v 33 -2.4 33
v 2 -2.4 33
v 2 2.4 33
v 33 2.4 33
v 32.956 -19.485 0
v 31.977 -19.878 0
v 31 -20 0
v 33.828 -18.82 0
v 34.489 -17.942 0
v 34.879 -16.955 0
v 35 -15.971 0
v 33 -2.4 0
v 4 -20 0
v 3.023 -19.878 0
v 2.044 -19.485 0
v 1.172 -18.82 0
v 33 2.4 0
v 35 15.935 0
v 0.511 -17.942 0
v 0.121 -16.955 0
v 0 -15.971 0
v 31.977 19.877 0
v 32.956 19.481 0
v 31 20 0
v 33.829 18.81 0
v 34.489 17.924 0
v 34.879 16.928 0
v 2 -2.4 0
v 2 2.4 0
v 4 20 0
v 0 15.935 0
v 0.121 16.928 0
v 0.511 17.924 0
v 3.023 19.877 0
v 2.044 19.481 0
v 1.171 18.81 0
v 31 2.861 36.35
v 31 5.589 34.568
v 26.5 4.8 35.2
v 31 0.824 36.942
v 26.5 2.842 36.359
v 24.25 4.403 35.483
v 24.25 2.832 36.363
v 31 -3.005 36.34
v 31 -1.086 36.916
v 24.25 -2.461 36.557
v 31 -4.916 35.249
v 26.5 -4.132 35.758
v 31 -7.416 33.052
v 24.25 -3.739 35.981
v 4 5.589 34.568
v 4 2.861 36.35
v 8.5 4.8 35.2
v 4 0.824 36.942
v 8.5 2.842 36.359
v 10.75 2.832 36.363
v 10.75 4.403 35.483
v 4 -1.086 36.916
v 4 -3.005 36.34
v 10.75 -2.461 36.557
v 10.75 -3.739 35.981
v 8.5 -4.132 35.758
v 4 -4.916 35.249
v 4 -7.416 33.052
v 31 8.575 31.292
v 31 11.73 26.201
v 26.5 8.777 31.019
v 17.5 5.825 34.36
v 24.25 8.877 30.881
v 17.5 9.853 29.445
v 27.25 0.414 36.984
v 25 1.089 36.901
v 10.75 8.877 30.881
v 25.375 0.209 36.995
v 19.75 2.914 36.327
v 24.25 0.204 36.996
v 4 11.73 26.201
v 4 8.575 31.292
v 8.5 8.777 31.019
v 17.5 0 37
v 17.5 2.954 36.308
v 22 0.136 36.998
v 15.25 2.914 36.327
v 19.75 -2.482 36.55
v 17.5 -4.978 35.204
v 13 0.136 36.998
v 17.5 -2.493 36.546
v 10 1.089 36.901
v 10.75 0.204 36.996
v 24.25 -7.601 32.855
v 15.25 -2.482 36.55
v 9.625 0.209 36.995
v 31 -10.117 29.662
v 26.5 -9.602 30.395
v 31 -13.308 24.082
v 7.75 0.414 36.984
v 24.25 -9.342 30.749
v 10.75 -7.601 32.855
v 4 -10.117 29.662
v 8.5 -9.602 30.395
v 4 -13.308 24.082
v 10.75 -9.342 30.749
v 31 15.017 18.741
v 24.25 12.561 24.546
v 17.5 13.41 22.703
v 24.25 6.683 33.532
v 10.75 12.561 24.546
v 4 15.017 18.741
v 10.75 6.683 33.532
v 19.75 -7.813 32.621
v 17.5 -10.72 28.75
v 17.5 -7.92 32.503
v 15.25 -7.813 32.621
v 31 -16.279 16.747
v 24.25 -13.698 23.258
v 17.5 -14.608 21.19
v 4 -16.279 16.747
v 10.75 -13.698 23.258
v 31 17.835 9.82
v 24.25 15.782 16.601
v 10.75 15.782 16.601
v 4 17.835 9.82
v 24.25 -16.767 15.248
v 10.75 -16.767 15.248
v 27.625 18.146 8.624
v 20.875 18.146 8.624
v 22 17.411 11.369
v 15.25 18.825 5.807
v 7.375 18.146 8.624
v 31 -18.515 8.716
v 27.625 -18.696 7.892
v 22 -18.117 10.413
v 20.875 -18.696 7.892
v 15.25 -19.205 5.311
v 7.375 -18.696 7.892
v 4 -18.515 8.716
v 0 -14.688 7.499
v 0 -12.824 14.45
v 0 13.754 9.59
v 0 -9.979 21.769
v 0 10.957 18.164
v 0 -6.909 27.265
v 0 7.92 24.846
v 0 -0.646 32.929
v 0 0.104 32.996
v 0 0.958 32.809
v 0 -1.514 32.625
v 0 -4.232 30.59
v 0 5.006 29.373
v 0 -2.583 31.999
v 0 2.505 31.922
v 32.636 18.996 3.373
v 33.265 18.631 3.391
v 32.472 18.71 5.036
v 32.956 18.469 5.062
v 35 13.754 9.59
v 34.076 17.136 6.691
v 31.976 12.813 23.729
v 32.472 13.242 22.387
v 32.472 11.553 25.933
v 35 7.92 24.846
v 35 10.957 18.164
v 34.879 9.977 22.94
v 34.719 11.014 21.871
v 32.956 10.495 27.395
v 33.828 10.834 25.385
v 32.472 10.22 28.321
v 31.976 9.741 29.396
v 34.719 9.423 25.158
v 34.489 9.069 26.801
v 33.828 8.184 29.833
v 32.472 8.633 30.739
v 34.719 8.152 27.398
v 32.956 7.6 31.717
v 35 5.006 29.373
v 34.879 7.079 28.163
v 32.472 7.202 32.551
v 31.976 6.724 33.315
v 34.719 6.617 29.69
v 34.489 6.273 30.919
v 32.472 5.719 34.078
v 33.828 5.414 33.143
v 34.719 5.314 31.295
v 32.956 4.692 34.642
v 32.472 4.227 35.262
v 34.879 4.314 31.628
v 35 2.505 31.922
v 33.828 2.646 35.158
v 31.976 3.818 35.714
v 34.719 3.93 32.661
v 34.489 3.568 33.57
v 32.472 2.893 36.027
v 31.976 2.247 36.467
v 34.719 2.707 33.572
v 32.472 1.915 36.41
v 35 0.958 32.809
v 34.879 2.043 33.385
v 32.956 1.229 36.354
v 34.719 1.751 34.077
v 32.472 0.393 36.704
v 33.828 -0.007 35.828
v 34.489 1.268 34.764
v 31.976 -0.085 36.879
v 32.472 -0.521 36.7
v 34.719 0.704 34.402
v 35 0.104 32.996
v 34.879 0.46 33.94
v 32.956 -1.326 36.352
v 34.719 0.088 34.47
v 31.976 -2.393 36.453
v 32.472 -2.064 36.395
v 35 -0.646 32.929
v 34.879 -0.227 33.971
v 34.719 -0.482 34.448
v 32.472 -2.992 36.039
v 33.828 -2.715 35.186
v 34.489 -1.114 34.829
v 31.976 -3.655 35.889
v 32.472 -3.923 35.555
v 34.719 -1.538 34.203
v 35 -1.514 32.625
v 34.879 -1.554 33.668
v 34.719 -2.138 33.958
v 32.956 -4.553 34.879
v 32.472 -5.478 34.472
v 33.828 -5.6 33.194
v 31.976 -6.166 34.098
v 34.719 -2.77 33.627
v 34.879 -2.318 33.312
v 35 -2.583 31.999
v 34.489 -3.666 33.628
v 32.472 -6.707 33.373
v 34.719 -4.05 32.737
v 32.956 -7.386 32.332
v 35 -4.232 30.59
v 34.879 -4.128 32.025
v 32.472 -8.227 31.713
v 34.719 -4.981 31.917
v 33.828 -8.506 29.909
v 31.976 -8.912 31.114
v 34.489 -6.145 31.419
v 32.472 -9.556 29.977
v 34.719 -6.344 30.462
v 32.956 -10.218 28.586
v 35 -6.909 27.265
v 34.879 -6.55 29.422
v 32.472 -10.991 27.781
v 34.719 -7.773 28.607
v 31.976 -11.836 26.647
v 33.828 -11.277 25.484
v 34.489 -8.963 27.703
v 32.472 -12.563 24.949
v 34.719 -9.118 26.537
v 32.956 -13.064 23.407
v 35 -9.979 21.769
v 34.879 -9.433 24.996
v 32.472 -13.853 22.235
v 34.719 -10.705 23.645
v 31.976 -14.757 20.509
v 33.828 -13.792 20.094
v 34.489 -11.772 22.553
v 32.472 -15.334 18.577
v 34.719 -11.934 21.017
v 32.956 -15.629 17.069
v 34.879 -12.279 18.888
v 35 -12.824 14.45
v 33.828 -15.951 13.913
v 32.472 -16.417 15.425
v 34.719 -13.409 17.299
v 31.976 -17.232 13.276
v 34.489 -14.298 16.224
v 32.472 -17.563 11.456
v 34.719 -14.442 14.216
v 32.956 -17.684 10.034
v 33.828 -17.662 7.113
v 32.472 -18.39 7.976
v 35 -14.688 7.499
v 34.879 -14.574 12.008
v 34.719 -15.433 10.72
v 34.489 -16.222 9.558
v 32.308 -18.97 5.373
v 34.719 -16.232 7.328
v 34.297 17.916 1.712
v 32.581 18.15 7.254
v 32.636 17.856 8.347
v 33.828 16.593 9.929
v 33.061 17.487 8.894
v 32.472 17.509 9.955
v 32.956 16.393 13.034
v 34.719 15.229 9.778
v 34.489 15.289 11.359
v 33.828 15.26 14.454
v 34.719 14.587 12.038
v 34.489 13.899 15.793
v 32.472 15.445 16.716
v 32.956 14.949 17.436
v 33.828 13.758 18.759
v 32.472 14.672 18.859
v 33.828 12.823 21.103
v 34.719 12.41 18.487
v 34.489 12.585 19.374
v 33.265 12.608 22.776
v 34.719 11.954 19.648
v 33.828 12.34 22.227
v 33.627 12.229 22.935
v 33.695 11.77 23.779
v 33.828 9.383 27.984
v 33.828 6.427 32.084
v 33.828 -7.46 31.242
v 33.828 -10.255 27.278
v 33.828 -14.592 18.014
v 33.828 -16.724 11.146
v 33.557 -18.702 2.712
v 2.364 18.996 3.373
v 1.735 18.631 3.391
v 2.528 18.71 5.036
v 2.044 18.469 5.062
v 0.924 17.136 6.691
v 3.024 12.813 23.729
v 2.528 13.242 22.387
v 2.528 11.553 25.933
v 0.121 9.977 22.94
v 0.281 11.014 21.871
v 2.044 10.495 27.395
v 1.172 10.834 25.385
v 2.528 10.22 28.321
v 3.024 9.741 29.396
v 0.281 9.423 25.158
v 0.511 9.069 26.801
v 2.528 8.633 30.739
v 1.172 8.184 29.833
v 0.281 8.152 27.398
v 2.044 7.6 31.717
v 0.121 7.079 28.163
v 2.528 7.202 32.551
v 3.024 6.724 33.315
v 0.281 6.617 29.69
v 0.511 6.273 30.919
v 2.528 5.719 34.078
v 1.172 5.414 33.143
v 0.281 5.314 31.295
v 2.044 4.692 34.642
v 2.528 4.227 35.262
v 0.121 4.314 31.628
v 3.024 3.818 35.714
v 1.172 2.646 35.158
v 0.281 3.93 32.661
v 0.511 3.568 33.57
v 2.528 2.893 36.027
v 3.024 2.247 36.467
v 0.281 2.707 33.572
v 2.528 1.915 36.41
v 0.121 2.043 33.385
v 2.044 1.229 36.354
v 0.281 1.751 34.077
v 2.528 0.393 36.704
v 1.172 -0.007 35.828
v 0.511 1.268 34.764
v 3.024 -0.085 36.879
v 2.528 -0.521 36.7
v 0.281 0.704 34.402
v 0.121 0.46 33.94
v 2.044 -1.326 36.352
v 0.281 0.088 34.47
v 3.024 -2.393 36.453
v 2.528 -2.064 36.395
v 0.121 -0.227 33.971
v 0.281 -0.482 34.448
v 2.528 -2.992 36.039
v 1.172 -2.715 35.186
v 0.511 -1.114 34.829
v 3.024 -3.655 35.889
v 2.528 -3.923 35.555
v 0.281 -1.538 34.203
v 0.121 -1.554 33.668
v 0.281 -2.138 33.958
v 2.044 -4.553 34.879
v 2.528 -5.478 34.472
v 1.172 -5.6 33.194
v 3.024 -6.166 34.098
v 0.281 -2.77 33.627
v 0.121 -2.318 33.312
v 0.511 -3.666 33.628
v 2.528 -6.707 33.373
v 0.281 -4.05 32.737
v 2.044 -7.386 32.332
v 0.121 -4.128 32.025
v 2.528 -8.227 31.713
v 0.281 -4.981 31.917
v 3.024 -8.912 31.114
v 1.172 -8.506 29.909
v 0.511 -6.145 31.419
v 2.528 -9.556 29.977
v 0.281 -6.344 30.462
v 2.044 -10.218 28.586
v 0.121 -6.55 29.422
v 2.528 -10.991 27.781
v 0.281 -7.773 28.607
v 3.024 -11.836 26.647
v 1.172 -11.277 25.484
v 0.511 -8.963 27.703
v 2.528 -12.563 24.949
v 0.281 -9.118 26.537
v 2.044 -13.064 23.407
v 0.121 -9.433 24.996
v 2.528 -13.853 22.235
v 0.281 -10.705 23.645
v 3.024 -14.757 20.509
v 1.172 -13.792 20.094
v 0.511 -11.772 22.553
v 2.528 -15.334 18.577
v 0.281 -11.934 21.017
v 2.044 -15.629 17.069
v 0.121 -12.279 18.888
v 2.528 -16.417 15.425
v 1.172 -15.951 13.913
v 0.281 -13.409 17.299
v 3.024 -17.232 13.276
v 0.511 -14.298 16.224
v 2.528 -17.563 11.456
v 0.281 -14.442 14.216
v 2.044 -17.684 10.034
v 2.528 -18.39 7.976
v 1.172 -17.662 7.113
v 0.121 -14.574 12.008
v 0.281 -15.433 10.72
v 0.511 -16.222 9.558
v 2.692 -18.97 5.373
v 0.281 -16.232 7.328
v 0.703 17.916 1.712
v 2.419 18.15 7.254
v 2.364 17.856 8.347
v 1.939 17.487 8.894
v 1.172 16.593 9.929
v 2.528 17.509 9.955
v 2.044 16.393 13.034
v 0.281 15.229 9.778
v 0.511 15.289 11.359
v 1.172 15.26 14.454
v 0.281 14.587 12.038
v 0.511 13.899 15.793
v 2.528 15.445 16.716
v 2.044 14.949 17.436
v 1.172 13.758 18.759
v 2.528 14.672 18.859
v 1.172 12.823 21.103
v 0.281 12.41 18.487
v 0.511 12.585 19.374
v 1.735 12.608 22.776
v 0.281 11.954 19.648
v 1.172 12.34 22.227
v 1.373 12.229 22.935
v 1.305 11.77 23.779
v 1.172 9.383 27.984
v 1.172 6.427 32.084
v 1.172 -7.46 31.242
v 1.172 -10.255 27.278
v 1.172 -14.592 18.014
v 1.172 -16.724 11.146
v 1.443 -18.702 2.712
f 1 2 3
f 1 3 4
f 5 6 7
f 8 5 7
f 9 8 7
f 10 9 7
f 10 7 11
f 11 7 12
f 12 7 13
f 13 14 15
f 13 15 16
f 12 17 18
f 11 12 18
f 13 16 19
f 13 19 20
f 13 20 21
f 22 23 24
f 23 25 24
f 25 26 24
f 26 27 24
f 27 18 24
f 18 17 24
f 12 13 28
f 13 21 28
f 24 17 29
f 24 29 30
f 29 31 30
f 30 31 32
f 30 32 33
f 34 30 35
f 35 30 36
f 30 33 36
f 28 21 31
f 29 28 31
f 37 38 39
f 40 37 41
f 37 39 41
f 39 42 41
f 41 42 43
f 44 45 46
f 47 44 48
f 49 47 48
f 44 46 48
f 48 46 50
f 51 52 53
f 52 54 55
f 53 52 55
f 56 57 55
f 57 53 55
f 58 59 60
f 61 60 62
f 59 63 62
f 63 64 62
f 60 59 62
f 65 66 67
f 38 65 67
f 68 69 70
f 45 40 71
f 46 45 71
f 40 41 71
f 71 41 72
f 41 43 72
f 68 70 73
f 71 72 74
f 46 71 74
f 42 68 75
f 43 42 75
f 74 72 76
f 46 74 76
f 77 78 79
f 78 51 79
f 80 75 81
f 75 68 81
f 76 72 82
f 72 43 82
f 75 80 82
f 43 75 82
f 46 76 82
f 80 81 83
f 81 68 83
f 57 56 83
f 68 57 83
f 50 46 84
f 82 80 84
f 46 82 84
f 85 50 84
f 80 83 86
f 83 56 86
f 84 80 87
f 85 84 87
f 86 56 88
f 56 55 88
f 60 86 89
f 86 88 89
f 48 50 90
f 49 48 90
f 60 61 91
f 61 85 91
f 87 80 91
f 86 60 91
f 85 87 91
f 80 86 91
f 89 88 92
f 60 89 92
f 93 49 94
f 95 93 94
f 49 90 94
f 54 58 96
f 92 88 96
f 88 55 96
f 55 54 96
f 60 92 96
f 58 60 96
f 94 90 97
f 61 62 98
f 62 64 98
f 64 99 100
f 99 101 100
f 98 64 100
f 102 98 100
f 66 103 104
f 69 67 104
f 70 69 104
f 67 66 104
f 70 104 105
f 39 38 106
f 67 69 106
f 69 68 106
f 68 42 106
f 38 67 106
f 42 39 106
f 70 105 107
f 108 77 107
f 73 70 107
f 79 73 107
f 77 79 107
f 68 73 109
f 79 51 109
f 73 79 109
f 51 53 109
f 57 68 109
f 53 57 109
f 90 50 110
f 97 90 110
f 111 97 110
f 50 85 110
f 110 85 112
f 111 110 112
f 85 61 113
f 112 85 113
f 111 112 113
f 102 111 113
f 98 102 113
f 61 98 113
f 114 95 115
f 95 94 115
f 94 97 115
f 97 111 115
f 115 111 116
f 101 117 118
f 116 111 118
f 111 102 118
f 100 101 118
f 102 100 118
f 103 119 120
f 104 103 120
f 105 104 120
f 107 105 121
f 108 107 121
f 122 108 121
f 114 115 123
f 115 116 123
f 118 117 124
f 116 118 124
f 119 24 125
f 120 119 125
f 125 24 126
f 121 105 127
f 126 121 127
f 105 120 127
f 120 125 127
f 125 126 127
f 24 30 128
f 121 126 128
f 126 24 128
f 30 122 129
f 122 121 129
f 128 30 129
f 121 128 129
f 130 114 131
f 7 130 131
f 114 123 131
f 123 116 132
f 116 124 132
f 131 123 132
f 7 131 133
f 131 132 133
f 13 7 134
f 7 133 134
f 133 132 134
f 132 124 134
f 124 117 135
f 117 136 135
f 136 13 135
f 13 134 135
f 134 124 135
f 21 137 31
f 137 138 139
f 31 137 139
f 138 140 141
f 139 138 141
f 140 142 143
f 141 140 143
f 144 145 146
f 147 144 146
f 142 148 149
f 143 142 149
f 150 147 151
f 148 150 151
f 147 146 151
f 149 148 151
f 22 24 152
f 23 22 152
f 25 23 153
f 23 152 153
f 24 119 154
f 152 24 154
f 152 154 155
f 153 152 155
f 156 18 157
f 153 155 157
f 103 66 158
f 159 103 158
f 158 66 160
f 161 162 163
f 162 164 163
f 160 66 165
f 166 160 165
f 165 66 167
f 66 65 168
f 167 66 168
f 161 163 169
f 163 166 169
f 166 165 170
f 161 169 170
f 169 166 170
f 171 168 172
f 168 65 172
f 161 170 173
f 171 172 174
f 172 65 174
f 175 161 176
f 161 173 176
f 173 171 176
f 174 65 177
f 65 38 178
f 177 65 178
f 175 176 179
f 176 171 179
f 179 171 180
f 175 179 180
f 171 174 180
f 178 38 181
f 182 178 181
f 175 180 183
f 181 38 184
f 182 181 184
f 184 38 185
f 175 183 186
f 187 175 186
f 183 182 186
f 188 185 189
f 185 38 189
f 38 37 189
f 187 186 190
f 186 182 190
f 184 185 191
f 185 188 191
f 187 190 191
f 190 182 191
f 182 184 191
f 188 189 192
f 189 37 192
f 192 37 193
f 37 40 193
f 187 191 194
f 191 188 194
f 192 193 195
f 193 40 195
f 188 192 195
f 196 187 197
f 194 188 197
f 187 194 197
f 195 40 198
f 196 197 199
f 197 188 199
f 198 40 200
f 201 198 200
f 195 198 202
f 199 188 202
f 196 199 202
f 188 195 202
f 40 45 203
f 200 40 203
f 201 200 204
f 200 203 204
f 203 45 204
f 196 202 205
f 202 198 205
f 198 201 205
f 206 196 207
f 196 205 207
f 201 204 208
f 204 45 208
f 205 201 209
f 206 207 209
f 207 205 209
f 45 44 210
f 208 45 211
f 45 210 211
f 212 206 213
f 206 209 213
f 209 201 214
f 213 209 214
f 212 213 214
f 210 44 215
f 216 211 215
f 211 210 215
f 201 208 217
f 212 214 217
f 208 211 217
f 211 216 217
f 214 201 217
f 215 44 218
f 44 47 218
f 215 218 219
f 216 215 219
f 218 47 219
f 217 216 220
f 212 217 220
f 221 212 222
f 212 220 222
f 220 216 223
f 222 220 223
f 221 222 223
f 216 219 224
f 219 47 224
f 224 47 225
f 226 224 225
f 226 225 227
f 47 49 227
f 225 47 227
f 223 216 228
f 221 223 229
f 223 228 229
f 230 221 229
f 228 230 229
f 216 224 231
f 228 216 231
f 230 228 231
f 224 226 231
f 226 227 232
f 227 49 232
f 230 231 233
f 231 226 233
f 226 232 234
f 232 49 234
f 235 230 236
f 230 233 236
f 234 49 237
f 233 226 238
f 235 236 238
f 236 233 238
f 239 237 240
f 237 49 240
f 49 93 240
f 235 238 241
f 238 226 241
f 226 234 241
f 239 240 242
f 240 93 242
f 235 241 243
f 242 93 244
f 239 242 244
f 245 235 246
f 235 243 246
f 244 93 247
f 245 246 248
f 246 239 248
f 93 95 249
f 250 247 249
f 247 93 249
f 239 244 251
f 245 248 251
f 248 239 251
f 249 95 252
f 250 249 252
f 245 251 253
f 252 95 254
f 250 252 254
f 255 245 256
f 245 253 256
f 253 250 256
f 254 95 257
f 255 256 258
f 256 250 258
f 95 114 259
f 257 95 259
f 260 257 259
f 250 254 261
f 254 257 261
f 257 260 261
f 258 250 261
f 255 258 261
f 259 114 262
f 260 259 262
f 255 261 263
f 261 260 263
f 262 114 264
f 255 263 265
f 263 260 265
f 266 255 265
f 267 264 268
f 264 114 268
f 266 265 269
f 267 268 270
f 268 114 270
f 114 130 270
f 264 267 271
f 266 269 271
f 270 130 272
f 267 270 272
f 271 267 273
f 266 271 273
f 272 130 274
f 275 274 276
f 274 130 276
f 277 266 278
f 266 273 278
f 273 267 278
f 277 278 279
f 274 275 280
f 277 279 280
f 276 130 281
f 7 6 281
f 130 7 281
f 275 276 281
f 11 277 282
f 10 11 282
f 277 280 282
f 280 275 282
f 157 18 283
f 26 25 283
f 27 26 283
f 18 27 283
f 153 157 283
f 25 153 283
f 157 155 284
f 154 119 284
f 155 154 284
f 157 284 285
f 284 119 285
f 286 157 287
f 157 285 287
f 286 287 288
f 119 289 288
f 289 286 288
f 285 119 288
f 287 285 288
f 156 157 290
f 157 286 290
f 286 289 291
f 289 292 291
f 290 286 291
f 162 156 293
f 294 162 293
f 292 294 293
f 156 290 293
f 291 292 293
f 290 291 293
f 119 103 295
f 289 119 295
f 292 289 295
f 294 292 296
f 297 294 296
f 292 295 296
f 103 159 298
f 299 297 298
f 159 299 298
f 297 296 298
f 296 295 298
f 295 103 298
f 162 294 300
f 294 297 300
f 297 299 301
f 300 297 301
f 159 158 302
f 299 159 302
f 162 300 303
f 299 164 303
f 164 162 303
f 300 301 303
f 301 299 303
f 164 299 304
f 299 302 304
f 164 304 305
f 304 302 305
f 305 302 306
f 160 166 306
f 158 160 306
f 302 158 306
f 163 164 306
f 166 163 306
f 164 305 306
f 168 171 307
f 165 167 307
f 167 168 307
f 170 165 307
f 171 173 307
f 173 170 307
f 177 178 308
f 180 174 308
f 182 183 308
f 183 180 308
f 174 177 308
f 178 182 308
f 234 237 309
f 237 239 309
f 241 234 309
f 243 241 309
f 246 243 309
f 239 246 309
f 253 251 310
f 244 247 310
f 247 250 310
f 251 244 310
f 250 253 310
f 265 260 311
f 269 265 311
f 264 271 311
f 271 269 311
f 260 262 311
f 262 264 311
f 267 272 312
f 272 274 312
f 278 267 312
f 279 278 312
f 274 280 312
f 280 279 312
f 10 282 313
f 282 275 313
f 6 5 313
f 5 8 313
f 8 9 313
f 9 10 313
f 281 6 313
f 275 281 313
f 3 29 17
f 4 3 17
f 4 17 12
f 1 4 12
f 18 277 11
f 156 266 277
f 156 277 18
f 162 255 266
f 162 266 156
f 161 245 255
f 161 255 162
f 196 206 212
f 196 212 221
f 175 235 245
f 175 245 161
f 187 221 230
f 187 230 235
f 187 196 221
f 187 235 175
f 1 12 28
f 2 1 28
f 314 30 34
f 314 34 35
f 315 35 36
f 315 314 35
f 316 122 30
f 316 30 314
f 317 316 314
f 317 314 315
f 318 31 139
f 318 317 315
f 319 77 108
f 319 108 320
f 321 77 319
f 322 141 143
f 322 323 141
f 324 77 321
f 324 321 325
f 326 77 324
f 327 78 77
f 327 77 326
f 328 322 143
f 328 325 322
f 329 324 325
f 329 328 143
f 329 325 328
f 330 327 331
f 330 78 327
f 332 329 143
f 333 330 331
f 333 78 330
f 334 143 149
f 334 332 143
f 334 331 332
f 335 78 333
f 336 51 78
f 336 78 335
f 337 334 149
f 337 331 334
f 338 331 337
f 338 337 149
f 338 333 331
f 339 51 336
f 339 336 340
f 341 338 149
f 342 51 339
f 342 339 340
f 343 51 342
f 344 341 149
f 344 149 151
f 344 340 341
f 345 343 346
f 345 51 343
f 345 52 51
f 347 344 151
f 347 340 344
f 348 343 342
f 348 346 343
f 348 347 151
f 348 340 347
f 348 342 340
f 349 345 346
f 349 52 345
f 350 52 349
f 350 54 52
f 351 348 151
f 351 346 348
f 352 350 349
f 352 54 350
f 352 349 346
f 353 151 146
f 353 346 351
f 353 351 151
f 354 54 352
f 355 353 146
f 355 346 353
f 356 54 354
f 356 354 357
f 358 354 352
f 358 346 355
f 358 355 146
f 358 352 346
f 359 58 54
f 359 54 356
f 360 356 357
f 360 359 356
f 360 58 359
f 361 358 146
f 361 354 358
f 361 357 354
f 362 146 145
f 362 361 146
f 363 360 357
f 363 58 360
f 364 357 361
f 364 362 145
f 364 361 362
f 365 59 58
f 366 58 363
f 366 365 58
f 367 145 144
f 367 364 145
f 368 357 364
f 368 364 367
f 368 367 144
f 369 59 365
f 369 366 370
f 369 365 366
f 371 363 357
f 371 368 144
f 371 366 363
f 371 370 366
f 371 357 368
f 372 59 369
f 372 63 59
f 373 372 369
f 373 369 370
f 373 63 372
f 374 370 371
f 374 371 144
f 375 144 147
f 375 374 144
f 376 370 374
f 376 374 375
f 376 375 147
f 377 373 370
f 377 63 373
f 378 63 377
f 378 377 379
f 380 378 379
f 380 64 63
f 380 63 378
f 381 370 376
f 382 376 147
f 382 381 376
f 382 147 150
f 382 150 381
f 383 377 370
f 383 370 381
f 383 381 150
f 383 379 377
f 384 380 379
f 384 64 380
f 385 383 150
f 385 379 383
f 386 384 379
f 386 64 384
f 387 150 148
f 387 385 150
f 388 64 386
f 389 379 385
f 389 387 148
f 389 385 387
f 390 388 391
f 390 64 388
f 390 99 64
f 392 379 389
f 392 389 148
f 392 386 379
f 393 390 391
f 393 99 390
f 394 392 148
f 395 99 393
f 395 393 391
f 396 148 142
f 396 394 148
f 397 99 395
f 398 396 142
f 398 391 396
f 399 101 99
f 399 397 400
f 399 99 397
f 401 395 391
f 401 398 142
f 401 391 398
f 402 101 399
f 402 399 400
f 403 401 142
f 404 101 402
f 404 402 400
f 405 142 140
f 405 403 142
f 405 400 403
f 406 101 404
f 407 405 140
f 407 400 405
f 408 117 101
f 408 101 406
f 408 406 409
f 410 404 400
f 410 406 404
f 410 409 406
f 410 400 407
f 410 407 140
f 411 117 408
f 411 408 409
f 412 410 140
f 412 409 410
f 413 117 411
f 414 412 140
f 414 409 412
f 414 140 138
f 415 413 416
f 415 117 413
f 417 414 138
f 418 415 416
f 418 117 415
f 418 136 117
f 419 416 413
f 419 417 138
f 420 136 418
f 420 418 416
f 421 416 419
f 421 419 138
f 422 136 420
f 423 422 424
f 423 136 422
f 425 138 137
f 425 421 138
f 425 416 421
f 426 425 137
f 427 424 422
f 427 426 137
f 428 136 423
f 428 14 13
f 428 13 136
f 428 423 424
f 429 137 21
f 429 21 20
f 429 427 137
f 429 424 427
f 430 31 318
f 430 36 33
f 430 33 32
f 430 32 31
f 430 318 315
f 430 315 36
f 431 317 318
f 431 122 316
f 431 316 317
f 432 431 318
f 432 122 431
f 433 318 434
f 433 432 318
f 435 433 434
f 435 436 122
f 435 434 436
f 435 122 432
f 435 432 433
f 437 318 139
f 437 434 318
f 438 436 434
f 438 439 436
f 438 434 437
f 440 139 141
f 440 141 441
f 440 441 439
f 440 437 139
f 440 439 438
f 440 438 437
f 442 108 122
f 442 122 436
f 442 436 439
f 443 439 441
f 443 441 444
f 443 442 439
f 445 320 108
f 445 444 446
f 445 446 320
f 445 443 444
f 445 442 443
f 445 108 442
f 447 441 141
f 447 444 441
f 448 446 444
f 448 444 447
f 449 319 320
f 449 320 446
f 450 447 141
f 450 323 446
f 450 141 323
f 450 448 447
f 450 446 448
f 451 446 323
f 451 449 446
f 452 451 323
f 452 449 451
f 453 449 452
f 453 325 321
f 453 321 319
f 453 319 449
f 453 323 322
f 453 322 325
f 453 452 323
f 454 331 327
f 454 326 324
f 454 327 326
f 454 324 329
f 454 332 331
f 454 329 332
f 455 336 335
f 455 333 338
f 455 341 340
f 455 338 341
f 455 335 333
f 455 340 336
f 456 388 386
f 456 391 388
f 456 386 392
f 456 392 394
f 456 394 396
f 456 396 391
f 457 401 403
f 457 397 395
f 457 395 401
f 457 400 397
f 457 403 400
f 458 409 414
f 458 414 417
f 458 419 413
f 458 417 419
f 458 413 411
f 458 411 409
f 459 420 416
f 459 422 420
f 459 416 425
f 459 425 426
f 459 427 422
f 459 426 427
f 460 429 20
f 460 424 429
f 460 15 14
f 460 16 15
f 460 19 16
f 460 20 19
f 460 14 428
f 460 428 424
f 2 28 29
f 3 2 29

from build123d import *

# Parameters (mm, degrees)
F4_DEPTH = 35
F6_DEPTH = 33
F7_R     = 4


# Not quite as in the source:
# - a feature names something its author has since deleted; it is built from what else it names


with BuildPart() as f4:
    # F3 (on Right) → F4 (new body)
    with BuildSketch(Plane.YZ):
        with BuildLine():
            Line((-20, 0), (0, 0))
            Line((0, 0), (0, 37))
            add(Edge.make_bspline(
                [(0, 37), (-8.5256332532, 37.0518802553), (-17.6288448274, 20.054070279), (-20, 0)],
                knots=[0.5, 0.5, 0.5, 0.5, 1, 1, 1, 1], degree=3))
        make_face()
        with BuildLine():
            Line((0, 37), (0, 0))
            Line((0, 0), (20, 0))
            add(Edge.make_bspline(
                [(20, 0), (16.4736881852, 19.8465492576), (8.5256332532, 36.9481197447), (0, 37)],
                knots=[0, 0, 0, 0, 0.5, 0.5, 0.5, 0.5], degree=3))
        make_face()
    extrude(amount=F4_DEPTH)

    # F5 (on face) → F6 (cut)
    with BuildSketch(Plane(origin=(0, 0, 0), x_dir=(1, 0, 0), z_dir=(0, 0, -1))):
        Polygon((2, 2.4), (2, 0), (2, -2.4), (33, -2.4), (33, 0), (33, 2.4), align=None)
    extrude(amount=-F6_DEPTH, mode=Mode.SUBTRACT)

    # F7
    f7_edges = [f4.edges().sort_by_distance(p)[0] for p in [
        (35, -0.138558, 36.999345),
        (0, -0.138558, 36.999345),
    ]]
    fillet(f7_edges, radius=F7_R)


solid = f4.part
